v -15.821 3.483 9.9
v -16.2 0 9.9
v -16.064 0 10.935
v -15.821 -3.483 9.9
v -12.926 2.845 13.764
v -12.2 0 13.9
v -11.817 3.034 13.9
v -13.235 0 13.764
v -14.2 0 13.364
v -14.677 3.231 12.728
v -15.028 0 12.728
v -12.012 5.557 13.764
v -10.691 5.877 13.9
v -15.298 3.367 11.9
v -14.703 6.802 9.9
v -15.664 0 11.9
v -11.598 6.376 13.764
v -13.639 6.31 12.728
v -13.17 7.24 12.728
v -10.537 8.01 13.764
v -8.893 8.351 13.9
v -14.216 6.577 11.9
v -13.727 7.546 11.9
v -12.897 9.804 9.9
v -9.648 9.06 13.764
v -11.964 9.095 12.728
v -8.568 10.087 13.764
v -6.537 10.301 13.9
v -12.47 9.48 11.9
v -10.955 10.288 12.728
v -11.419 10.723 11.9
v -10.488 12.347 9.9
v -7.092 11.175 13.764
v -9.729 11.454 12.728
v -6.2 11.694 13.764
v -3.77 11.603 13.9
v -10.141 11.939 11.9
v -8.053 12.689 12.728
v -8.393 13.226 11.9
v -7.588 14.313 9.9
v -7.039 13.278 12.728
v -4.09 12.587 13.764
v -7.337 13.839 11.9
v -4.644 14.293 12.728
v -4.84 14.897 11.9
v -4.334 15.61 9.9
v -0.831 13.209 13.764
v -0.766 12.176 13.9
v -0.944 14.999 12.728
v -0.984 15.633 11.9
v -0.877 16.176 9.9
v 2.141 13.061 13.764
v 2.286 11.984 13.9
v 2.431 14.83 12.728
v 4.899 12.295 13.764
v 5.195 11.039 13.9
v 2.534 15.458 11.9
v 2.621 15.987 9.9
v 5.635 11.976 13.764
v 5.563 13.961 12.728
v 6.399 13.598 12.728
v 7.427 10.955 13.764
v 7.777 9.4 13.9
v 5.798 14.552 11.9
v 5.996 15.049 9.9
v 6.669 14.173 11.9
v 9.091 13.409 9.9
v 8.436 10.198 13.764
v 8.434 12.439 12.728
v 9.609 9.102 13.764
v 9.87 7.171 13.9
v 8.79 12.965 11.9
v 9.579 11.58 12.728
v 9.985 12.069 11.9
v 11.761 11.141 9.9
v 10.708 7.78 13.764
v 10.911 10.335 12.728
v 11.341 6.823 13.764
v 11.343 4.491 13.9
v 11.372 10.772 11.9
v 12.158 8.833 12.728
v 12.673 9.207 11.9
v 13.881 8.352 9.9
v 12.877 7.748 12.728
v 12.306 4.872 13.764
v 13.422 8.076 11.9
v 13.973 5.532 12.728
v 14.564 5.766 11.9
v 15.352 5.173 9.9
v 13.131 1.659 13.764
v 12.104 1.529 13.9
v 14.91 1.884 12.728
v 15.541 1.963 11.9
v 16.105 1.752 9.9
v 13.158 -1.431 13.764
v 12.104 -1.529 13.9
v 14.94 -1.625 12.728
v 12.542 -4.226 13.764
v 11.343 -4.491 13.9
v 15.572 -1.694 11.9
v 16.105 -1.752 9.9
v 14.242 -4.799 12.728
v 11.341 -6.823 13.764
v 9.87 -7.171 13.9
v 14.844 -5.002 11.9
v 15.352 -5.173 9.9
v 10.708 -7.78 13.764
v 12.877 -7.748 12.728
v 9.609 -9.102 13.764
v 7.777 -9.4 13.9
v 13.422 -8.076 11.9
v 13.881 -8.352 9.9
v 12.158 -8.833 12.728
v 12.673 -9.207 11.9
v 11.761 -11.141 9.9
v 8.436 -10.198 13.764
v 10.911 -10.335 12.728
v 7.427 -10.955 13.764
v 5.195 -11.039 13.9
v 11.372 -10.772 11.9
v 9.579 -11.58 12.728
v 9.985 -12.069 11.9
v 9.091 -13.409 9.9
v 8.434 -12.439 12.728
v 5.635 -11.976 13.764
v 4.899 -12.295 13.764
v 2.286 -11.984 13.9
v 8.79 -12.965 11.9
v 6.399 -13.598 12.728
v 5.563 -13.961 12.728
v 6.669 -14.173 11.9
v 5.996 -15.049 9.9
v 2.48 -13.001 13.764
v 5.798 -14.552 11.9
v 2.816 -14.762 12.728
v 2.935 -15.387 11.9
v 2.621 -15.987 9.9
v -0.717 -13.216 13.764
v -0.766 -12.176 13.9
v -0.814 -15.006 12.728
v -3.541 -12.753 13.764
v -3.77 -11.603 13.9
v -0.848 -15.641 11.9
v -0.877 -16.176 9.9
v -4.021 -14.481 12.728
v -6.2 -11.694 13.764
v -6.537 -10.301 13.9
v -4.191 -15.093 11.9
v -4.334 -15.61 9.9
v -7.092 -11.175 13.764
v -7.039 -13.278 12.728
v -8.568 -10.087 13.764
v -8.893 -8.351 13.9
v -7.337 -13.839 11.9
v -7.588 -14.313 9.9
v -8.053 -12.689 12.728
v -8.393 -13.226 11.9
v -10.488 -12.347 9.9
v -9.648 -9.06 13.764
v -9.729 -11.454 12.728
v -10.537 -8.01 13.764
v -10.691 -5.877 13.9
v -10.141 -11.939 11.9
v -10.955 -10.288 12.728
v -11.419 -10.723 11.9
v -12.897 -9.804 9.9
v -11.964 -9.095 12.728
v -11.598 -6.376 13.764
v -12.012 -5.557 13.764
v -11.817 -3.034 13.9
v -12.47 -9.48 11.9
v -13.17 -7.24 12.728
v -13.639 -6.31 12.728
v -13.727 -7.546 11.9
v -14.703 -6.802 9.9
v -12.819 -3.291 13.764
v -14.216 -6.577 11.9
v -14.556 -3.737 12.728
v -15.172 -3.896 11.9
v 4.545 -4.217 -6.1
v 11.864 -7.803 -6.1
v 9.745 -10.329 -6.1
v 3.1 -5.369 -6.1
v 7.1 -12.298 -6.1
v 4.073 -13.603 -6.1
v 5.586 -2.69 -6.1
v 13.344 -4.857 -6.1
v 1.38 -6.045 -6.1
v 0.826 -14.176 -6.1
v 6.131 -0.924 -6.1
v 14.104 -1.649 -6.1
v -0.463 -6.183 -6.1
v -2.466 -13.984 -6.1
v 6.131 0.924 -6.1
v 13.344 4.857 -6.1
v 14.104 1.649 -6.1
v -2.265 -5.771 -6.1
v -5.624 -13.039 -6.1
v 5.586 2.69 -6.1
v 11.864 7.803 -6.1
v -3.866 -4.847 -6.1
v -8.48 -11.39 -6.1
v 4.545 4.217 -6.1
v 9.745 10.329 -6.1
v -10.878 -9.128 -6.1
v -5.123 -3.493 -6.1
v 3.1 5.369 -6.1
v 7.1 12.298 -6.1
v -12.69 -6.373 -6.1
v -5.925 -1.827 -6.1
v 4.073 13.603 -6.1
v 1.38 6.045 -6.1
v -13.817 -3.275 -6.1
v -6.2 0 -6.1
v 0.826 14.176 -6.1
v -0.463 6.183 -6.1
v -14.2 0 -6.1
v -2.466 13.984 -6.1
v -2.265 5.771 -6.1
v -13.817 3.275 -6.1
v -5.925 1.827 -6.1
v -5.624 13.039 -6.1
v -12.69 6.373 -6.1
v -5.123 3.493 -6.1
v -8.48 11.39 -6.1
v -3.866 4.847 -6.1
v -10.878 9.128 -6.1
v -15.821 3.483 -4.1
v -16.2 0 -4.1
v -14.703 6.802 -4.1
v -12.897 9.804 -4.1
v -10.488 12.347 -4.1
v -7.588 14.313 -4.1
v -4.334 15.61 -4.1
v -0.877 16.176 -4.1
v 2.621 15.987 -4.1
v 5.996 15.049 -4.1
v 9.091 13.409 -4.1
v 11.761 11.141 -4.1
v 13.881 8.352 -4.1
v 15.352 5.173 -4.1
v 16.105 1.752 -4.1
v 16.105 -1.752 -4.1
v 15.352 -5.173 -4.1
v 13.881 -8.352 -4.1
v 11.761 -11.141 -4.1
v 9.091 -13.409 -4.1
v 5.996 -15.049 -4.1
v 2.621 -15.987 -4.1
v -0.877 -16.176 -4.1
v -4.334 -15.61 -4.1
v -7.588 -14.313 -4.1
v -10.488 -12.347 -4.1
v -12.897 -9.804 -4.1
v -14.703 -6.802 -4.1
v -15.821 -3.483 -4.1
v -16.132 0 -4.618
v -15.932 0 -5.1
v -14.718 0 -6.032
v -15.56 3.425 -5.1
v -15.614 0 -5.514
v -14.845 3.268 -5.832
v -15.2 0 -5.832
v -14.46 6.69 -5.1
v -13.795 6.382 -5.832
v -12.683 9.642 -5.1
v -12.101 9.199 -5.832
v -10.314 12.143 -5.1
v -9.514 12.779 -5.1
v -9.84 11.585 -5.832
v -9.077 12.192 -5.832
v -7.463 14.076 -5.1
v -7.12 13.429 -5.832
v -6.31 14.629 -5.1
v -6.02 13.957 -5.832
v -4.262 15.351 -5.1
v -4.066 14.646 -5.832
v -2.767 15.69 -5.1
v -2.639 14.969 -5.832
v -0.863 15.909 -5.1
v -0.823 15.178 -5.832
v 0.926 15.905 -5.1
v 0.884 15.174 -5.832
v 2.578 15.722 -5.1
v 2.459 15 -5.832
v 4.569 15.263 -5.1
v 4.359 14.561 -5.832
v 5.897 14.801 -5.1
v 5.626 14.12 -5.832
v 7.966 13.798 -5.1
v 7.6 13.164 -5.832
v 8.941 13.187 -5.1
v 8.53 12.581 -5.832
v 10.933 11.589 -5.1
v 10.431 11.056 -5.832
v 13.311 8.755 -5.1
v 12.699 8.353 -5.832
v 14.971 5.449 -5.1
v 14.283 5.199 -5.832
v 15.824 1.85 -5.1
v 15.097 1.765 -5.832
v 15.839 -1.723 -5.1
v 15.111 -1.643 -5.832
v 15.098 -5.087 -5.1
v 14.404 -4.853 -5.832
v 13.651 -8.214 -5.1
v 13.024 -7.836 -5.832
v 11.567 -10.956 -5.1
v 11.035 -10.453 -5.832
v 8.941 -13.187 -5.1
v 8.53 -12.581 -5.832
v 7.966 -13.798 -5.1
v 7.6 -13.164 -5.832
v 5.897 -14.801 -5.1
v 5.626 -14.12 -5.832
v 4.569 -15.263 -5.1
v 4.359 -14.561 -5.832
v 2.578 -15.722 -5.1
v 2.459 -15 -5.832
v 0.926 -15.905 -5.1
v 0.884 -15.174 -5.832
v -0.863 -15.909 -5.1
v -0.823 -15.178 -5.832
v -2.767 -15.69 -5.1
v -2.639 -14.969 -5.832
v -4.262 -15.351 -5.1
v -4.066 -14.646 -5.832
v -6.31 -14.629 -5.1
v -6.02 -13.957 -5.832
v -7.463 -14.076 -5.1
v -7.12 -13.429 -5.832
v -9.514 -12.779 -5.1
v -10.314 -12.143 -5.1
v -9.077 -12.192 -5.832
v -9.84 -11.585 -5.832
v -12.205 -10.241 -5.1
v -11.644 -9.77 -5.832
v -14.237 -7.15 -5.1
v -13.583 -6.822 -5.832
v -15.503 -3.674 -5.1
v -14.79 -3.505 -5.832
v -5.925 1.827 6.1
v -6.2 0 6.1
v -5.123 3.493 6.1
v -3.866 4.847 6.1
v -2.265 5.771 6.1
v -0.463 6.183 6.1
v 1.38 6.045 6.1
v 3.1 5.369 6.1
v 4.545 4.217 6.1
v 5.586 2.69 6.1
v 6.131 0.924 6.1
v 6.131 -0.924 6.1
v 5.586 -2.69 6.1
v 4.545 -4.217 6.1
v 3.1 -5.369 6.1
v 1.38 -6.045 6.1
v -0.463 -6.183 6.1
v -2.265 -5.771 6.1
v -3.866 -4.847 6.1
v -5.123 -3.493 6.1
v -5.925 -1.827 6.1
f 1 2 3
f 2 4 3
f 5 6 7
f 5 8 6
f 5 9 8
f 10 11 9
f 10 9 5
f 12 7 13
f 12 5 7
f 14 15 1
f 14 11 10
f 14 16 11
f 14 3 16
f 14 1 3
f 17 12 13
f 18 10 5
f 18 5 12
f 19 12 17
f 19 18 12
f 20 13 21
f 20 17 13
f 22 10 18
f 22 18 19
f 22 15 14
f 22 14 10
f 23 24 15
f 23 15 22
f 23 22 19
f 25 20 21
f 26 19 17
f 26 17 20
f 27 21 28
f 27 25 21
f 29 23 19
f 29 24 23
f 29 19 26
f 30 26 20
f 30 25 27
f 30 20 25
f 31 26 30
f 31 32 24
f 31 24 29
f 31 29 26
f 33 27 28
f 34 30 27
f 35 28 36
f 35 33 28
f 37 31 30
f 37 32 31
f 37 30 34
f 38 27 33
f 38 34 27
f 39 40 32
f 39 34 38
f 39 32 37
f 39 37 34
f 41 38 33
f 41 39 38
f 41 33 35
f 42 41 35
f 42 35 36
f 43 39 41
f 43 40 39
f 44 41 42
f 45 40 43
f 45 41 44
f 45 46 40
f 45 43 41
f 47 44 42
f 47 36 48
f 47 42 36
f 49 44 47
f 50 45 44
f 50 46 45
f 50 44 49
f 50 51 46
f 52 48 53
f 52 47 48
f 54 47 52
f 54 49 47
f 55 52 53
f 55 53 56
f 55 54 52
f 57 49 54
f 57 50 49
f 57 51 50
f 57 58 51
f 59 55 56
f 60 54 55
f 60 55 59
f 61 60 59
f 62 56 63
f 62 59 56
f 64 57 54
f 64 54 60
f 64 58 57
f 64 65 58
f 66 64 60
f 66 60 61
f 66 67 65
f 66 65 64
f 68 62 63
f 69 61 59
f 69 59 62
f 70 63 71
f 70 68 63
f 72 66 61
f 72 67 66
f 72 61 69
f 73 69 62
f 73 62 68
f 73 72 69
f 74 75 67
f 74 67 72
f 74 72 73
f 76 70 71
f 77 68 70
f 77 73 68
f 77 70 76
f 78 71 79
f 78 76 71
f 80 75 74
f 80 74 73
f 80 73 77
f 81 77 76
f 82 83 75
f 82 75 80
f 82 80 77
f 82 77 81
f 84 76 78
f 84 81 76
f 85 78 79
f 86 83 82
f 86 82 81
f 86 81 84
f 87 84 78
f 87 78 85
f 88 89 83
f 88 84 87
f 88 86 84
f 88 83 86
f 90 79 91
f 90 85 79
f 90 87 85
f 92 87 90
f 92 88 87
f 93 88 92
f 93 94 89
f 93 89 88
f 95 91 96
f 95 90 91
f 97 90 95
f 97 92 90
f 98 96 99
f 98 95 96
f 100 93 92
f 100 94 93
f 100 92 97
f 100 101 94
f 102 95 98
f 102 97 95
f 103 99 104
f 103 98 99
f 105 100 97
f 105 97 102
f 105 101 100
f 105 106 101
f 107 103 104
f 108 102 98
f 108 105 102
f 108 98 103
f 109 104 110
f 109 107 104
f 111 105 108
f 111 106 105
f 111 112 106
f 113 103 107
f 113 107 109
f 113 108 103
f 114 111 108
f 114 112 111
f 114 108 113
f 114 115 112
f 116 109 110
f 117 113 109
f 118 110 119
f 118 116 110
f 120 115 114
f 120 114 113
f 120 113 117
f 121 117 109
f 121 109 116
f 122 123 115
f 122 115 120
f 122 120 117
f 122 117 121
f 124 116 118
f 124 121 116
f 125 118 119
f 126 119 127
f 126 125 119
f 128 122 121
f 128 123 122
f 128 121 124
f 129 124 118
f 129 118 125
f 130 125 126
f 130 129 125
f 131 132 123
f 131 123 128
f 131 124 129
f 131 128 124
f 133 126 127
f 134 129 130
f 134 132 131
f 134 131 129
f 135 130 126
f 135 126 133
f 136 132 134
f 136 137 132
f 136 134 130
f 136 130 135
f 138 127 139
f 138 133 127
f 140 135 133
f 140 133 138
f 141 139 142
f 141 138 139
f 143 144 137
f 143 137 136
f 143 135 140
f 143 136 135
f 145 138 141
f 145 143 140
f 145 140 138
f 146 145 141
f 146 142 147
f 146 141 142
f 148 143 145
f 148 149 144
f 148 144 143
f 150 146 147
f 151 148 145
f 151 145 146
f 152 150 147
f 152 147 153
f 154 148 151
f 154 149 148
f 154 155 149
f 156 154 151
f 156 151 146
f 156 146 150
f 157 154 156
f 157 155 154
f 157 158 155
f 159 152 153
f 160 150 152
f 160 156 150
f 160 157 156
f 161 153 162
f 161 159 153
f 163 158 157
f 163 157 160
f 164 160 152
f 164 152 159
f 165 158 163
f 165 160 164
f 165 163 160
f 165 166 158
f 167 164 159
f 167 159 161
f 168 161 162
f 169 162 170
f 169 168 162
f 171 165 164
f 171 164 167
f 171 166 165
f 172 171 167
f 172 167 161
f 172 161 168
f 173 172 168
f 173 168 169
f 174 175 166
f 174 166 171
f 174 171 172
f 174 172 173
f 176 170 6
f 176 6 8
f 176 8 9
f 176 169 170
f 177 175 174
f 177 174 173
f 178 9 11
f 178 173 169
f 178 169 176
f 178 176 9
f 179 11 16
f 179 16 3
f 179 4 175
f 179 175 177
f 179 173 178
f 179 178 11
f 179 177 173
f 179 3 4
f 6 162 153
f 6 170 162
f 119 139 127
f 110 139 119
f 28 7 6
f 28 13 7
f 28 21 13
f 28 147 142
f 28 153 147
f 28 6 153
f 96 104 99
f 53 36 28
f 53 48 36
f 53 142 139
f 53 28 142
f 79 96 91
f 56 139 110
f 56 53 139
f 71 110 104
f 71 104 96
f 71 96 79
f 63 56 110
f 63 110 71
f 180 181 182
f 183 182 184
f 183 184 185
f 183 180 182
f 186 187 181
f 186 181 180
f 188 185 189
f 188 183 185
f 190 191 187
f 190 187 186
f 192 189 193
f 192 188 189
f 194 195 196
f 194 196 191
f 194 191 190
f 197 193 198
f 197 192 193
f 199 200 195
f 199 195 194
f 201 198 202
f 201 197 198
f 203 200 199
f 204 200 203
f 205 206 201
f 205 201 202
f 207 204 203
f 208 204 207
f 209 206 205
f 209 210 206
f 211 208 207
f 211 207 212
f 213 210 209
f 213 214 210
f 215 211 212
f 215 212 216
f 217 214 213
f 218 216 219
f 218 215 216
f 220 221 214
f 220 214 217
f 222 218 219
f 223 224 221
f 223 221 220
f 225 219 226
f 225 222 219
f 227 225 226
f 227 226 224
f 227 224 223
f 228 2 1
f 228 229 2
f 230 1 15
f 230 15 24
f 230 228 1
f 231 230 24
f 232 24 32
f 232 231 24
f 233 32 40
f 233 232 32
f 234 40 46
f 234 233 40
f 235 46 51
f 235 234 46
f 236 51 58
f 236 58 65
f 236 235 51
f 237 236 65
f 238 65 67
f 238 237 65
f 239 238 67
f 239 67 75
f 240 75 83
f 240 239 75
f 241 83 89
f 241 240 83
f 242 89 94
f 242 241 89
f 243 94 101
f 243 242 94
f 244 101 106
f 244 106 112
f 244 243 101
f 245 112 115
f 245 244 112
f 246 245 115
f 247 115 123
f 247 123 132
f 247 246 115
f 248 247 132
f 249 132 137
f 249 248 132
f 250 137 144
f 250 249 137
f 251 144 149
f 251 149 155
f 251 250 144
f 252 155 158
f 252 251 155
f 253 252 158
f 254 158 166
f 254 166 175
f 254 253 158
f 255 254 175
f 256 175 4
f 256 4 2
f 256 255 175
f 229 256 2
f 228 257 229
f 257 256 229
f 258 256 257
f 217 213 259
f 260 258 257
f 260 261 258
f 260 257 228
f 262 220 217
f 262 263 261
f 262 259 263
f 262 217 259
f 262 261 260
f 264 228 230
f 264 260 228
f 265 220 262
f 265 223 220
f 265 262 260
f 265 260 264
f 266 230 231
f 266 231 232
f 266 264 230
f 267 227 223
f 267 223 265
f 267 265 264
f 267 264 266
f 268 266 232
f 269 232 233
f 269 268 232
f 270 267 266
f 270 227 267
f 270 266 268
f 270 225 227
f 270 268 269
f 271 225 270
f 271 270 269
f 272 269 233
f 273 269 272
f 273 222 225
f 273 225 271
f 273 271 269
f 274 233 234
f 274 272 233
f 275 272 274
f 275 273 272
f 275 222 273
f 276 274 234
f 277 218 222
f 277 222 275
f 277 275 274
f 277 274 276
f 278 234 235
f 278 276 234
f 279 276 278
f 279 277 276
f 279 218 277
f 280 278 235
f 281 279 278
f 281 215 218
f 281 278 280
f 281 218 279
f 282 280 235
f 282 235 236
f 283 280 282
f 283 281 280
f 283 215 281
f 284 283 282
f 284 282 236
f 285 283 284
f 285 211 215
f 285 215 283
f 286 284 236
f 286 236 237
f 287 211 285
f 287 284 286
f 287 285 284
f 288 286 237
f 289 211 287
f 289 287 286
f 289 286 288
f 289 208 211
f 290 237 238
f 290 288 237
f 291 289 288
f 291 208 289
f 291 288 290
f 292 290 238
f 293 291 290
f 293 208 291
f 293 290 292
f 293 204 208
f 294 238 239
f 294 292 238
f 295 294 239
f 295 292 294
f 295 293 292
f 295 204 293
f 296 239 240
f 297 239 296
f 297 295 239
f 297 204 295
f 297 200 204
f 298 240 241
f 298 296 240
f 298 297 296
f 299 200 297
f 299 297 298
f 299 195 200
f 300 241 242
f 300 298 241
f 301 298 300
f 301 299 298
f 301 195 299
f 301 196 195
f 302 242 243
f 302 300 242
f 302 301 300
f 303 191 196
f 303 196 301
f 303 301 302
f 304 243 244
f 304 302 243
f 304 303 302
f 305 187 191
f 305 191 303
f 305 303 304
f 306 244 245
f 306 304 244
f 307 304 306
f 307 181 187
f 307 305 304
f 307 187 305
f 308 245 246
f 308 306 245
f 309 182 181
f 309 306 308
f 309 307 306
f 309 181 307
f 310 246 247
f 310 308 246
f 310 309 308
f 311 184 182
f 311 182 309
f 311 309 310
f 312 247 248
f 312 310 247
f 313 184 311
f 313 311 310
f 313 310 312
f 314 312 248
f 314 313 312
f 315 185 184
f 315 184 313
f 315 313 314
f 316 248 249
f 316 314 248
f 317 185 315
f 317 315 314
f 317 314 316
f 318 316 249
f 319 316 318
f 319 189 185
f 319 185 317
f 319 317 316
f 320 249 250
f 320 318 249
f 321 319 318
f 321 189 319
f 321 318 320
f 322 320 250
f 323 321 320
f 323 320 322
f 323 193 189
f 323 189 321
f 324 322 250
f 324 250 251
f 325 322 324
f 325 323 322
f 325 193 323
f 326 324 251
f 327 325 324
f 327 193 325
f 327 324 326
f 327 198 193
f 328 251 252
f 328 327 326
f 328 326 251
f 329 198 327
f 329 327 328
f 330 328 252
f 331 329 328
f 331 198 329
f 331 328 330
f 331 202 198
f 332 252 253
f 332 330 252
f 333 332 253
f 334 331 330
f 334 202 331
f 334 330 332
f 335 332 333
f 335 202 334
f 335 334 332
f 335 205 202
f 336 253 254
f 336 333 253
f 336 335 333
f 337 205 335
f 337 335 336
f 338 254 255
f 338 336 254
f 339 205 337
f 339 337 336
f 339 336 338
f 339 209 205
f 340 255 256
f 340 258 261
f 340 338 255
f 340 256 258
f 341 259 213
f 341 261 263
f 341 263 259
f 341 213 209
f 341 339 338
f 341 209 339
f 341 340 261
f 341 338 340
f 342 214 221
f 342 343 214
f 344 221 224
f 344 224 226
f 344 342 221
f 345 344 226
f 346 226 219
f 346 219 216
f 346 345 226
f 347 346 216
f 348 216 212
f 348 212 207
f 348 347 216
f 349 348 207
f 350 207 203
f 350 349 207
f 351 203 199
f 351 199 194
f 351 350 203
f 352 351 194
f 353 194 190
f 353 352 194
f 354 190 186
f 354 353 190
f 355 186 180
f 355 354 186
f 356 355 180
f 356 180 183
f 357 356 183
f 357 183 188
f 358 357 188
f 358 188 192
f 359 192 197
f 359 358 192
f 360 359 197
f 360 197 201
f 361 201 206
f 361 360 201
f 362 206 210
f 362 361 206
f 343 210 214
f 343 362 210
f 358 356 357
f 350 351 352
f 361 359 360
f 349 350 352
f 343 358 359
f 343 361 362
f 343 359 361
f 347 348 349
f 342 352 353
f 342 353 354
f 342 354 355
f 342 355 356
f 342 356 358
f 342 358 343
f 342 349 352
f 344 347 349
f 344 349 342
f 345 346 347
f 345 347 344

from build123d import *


with BuildPart() as f1:
    # F0 (on Front) → F1 (revolve)
    with BuildSketch(Plane.XZ):
        with BuildLine():
            Line((-6.2, 6.1), (0, 6.1))
            Line((0, 6.1), (0, 13.9))
            Line((0, 13.9), (-12.2, 13.9))
            ThreePointArc((-12.2, 13.9), (-15.028427, 12.728427), (-16.2, 9.9))
            Line((-16.2, 9.9), (-16.2, 6.1))
            Line((-16.2, 6.1), (-6.2, 6.1))
        make_face()
        with BuildLine():
            Line((-6.2, -6.1), (-6.2, 6.1))
            Line((-6.2, 6.1), (-16.2, 6.1))
            Line((-16.2, 6.1), (-16.2, -4.1))
            ThreePointArc((-16.2, -4.1), (-15.614214, -5.514214), (-14.2, -6.1))
            Line((-14.2, -6.1), (-6.2, -6.1))
        make_face()
    revolve(axis=Axis((0, 0, 10), (0, 0, -1)))


solid = f1.part
